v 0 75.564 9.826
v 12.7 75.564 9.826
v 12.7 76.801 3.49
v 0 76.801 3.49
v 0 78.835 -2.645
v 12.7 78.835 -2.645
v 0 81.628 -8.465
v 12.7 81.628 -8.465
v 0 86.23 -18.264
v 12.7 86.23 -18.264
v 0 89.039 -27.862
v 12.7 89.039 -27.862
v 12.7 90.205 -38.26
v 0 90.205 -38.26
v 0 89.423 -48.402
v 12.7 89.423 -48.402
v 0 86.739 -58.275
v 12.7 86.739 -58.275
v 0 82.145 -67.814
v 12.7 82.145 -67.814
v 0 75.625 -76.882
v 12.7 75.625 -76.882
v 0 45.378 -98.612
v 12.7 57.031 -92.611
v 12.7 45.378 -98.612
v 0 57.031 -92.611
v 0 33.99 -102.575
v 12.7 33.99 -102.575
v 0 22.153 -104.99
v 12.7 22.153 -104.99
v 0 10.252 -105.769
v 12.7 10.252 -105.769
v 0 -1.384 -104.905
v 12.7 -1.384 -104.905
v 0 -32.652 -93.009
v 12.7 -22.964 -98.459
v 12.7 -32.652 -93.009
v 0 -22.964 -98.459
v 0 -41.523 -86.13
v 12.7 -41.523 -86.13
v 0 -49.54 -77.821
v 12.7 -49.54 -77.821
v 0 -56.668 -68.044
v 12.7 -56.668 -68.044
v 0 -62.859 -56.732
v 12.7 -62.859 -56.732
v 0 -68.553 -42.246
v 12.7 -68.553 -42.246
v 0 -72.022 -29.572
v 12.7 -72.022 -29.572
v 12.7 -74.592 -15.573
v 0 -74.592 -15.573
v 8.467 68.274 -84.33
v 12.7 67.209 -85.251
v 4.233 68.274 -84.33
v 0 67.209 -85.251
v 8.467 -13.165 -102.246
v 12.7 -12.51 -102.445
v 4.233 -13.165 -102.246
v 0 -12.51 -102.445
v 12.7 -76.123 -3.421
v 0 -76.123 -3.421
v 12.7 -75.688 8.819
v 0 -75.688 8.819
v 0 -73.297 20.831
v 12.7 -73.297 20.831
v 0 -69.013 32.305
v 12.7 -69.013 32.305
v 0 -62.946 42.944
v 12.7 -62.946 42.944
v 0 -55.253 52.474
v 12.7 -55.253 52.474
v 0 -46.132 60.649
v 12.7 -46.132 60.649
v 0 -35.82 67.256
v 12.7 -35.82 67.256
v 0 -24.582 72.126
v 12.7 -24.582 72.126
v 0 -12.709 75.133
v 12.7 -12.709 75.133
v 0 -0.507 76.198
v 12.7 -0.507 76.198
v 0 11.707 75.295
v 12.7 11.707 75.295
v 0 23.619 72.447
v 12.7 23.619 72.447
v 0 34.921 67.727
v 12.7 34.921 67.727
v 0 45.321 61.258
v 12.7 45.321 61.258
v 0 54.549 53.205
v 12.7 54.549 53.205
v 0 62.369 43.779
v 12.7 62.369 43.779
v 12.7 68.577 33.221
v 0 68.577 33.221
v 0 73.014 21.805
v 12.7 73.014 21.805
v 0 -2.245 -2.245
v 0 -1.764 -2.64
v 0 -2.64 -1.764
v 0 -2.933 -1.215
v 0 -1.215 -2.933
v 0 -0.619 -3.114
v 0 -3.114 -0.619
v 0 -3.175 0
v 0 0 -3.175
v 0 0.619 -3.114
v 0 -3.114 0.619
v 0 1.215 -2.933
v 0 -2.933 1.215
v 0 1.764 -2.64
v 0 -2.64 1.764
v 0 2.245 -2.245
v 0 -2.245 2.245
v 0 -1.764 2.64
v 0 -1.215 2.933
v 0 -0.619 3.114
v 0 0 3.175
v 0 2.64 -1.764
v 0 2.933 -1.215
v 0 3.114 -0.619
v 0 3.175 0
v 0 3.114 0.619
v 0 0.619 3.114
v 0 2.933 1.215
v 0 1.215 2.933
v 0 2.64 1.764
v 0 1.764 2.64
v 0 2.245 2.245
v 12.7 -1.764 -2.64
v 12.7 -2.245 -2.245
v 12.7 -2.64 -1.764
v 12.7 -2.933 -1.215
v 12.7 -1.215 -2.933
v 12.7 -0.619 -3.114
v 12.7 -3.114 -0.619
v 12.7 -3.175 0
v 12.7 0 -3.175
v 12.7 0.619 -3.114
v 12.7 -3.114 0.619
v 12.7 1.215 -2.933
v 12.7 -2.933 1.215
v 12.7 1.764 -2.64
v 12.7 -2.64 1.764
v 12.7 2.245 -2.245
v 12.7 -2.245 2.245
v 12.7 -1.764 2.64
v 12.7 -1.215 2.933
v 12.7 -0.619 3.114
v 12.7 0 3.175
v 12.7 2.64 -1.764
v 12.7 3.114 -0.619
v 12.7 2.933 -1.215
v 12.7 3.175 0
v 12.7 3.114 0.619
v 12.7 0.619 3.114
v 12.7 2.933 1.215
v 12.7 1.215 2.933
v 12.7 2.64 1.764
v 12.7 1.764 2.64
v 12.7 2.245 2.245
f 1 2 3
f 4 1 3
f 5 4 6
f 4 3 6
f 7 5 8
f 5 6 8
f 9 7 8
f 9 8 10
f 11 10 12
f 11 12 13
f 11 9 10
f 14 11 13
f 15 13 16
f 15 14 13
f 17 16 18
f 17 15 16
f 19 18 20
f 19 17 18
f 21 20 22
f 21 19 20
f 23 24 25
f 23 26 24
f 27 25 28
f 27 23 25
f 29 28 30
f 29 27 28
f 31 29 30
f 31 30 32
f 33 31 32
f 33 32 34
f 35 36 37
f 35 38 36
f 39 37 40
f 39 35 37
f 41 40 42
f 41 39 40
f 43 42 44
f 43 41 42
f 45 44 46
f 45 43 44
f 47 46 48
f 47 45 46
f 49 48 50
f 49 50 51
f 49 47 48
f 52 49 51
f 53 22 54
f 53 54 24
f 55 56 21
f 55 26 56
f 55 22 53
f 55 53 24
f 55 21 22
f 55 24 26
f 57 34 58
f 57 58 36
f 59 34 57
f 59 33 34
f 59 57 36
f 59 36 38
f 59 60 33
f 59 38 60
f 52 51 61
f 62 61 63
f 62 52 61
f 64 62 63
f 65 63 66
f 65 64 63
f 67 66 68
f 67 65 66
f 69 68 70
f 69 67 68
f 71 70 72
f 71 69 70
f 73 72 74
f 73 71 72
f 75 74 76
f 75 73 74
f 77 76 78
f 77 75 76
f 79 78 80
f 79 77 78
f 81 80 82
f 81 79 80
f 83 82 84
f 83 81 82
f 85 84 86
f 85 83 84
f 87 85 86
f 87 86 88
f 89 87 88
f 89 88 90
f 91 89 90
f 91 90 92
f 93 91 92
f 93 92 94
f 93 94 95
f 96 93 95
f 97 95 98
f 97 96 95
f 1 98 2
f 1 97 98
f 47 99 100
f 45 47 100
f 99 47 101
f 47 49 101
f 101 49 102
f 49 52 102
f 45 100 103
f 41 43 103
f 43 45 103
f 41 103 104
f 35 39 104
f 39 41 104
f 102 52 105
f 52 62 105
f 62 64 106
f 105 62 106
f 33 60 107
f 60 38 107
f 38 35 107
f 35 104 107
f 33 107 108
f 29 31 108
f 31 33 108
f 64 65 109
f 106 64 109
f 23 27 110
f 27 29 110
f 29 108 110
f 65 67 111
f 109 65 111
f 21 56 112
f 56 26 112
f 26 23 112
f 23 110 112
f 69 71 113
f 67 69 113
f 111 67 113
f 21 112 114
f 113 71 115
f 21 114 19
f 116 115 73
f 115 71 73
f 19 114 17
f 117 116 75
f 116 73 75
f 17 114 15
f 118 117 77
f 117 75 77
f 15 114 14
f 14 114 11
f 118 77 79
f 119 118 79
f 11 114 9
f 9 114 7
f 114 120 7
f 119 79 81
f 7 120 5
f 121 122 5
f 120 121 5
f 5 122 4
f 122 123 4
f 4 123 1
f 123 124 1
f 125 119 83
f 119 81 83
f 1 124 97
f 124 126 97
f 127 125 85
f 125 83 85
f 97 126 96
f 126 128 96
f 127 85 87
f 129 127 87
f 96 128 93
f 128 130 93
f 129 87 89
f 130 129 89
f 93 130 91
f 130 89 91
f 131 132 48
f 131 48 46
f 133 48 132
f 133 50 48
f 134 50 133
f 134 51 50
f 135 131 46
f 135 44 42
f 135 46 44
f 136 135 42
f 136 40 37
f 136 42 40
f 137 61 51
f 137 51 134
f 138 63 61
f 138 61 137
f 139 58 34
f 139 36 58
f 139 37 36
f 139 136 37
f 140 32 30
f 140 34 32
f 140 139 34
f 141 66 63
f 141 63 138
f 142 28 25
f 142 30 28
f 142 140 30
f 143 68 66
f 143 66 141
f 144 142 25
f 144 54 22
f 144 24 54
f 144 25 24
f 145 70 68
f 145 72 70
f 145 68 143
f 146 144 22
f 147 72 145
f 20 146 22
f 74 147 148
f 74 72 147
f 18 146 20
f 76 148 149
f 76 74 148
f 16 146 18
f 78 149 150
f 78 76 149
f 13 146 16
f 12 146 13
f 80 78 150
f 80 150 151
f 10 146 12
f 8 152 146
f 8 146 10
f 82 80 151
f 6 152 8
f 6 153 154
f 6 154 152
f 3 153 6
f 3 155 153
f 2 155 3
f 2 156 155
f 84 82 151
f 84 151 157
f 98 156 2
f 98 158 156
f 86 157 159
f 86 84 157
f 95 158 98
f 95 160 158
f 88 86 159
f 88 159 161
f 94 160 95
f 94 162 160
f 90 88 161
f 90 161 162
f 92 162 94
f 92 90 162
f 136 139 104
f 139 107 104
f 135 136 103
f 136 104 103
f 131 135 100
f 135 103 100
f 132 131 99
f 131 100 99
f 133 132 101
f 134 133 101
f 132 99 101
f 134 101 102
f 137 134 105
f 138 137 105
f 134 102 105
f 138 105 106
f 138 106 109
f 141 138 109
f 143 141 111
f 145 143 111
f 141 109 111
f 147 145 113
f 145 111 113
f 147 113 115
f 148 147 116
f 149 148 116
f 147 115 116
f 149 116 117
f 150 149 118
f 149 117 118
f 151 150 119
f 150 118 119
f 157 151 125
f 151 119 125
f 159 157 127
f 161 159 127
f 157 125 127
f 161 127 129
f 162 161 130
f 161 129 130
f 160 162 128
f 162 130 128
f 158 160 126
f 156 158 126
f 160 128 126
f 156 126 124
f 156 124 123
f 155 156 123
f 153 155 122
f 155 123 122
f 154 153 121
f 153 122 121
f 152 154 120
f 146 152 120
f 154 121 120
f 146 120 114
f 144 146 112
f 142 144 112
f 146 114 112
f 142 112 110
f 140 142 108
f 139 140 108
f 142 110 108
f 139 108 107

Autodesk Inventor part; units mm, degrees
ref_plane "YZ Plane" through (0, 0, 0) normal (1, 0, 0) x (0, 1, 0)
ref_plane "XZ Plane" through (0, 0, 0) normal (0, 1, 0) x (-1, 0, 0)
ref_plane "XY Plane" through (0, 0, 0) normal (0, 0, 1) x (1, 0, 0)
sketch "Sketch1" plane through (0, 0, 0) normal (1, 0, 0) x (0, 1, 0)
  circle A0 centre (0, 0) radius 76.2
  spline S0 degree 3 poles (76.2, 0) (145.5168, -95.878) (-64.2426, -180.0292) (-76.2, 0) knots 0 0 0 0 1 1 1 1
  point P0 (76.2, -76.2)
  point P1 (0, -105.0953)
  dimension "d0" = 152.4
extrude "Extrusion1" add sketch "Sketch1" along normal blind 12.7
fillet "Fillet1" radius 50.8 1 edges at (6.35, 76.2, 0)
sketch "Sketch2" plane through (12.7, 0, 0) normal (1, 0, 0) x (0, 0, -1)
  arc A0 (-9.8256, 75.5639) -> (0, -76.2) centre (0, 0) ccw projected
hole "Hole1" at (12.7, 0, 0) direction (-1, 0, 0) diameter 6.35 end through all
properties part number "plateCamPart"
